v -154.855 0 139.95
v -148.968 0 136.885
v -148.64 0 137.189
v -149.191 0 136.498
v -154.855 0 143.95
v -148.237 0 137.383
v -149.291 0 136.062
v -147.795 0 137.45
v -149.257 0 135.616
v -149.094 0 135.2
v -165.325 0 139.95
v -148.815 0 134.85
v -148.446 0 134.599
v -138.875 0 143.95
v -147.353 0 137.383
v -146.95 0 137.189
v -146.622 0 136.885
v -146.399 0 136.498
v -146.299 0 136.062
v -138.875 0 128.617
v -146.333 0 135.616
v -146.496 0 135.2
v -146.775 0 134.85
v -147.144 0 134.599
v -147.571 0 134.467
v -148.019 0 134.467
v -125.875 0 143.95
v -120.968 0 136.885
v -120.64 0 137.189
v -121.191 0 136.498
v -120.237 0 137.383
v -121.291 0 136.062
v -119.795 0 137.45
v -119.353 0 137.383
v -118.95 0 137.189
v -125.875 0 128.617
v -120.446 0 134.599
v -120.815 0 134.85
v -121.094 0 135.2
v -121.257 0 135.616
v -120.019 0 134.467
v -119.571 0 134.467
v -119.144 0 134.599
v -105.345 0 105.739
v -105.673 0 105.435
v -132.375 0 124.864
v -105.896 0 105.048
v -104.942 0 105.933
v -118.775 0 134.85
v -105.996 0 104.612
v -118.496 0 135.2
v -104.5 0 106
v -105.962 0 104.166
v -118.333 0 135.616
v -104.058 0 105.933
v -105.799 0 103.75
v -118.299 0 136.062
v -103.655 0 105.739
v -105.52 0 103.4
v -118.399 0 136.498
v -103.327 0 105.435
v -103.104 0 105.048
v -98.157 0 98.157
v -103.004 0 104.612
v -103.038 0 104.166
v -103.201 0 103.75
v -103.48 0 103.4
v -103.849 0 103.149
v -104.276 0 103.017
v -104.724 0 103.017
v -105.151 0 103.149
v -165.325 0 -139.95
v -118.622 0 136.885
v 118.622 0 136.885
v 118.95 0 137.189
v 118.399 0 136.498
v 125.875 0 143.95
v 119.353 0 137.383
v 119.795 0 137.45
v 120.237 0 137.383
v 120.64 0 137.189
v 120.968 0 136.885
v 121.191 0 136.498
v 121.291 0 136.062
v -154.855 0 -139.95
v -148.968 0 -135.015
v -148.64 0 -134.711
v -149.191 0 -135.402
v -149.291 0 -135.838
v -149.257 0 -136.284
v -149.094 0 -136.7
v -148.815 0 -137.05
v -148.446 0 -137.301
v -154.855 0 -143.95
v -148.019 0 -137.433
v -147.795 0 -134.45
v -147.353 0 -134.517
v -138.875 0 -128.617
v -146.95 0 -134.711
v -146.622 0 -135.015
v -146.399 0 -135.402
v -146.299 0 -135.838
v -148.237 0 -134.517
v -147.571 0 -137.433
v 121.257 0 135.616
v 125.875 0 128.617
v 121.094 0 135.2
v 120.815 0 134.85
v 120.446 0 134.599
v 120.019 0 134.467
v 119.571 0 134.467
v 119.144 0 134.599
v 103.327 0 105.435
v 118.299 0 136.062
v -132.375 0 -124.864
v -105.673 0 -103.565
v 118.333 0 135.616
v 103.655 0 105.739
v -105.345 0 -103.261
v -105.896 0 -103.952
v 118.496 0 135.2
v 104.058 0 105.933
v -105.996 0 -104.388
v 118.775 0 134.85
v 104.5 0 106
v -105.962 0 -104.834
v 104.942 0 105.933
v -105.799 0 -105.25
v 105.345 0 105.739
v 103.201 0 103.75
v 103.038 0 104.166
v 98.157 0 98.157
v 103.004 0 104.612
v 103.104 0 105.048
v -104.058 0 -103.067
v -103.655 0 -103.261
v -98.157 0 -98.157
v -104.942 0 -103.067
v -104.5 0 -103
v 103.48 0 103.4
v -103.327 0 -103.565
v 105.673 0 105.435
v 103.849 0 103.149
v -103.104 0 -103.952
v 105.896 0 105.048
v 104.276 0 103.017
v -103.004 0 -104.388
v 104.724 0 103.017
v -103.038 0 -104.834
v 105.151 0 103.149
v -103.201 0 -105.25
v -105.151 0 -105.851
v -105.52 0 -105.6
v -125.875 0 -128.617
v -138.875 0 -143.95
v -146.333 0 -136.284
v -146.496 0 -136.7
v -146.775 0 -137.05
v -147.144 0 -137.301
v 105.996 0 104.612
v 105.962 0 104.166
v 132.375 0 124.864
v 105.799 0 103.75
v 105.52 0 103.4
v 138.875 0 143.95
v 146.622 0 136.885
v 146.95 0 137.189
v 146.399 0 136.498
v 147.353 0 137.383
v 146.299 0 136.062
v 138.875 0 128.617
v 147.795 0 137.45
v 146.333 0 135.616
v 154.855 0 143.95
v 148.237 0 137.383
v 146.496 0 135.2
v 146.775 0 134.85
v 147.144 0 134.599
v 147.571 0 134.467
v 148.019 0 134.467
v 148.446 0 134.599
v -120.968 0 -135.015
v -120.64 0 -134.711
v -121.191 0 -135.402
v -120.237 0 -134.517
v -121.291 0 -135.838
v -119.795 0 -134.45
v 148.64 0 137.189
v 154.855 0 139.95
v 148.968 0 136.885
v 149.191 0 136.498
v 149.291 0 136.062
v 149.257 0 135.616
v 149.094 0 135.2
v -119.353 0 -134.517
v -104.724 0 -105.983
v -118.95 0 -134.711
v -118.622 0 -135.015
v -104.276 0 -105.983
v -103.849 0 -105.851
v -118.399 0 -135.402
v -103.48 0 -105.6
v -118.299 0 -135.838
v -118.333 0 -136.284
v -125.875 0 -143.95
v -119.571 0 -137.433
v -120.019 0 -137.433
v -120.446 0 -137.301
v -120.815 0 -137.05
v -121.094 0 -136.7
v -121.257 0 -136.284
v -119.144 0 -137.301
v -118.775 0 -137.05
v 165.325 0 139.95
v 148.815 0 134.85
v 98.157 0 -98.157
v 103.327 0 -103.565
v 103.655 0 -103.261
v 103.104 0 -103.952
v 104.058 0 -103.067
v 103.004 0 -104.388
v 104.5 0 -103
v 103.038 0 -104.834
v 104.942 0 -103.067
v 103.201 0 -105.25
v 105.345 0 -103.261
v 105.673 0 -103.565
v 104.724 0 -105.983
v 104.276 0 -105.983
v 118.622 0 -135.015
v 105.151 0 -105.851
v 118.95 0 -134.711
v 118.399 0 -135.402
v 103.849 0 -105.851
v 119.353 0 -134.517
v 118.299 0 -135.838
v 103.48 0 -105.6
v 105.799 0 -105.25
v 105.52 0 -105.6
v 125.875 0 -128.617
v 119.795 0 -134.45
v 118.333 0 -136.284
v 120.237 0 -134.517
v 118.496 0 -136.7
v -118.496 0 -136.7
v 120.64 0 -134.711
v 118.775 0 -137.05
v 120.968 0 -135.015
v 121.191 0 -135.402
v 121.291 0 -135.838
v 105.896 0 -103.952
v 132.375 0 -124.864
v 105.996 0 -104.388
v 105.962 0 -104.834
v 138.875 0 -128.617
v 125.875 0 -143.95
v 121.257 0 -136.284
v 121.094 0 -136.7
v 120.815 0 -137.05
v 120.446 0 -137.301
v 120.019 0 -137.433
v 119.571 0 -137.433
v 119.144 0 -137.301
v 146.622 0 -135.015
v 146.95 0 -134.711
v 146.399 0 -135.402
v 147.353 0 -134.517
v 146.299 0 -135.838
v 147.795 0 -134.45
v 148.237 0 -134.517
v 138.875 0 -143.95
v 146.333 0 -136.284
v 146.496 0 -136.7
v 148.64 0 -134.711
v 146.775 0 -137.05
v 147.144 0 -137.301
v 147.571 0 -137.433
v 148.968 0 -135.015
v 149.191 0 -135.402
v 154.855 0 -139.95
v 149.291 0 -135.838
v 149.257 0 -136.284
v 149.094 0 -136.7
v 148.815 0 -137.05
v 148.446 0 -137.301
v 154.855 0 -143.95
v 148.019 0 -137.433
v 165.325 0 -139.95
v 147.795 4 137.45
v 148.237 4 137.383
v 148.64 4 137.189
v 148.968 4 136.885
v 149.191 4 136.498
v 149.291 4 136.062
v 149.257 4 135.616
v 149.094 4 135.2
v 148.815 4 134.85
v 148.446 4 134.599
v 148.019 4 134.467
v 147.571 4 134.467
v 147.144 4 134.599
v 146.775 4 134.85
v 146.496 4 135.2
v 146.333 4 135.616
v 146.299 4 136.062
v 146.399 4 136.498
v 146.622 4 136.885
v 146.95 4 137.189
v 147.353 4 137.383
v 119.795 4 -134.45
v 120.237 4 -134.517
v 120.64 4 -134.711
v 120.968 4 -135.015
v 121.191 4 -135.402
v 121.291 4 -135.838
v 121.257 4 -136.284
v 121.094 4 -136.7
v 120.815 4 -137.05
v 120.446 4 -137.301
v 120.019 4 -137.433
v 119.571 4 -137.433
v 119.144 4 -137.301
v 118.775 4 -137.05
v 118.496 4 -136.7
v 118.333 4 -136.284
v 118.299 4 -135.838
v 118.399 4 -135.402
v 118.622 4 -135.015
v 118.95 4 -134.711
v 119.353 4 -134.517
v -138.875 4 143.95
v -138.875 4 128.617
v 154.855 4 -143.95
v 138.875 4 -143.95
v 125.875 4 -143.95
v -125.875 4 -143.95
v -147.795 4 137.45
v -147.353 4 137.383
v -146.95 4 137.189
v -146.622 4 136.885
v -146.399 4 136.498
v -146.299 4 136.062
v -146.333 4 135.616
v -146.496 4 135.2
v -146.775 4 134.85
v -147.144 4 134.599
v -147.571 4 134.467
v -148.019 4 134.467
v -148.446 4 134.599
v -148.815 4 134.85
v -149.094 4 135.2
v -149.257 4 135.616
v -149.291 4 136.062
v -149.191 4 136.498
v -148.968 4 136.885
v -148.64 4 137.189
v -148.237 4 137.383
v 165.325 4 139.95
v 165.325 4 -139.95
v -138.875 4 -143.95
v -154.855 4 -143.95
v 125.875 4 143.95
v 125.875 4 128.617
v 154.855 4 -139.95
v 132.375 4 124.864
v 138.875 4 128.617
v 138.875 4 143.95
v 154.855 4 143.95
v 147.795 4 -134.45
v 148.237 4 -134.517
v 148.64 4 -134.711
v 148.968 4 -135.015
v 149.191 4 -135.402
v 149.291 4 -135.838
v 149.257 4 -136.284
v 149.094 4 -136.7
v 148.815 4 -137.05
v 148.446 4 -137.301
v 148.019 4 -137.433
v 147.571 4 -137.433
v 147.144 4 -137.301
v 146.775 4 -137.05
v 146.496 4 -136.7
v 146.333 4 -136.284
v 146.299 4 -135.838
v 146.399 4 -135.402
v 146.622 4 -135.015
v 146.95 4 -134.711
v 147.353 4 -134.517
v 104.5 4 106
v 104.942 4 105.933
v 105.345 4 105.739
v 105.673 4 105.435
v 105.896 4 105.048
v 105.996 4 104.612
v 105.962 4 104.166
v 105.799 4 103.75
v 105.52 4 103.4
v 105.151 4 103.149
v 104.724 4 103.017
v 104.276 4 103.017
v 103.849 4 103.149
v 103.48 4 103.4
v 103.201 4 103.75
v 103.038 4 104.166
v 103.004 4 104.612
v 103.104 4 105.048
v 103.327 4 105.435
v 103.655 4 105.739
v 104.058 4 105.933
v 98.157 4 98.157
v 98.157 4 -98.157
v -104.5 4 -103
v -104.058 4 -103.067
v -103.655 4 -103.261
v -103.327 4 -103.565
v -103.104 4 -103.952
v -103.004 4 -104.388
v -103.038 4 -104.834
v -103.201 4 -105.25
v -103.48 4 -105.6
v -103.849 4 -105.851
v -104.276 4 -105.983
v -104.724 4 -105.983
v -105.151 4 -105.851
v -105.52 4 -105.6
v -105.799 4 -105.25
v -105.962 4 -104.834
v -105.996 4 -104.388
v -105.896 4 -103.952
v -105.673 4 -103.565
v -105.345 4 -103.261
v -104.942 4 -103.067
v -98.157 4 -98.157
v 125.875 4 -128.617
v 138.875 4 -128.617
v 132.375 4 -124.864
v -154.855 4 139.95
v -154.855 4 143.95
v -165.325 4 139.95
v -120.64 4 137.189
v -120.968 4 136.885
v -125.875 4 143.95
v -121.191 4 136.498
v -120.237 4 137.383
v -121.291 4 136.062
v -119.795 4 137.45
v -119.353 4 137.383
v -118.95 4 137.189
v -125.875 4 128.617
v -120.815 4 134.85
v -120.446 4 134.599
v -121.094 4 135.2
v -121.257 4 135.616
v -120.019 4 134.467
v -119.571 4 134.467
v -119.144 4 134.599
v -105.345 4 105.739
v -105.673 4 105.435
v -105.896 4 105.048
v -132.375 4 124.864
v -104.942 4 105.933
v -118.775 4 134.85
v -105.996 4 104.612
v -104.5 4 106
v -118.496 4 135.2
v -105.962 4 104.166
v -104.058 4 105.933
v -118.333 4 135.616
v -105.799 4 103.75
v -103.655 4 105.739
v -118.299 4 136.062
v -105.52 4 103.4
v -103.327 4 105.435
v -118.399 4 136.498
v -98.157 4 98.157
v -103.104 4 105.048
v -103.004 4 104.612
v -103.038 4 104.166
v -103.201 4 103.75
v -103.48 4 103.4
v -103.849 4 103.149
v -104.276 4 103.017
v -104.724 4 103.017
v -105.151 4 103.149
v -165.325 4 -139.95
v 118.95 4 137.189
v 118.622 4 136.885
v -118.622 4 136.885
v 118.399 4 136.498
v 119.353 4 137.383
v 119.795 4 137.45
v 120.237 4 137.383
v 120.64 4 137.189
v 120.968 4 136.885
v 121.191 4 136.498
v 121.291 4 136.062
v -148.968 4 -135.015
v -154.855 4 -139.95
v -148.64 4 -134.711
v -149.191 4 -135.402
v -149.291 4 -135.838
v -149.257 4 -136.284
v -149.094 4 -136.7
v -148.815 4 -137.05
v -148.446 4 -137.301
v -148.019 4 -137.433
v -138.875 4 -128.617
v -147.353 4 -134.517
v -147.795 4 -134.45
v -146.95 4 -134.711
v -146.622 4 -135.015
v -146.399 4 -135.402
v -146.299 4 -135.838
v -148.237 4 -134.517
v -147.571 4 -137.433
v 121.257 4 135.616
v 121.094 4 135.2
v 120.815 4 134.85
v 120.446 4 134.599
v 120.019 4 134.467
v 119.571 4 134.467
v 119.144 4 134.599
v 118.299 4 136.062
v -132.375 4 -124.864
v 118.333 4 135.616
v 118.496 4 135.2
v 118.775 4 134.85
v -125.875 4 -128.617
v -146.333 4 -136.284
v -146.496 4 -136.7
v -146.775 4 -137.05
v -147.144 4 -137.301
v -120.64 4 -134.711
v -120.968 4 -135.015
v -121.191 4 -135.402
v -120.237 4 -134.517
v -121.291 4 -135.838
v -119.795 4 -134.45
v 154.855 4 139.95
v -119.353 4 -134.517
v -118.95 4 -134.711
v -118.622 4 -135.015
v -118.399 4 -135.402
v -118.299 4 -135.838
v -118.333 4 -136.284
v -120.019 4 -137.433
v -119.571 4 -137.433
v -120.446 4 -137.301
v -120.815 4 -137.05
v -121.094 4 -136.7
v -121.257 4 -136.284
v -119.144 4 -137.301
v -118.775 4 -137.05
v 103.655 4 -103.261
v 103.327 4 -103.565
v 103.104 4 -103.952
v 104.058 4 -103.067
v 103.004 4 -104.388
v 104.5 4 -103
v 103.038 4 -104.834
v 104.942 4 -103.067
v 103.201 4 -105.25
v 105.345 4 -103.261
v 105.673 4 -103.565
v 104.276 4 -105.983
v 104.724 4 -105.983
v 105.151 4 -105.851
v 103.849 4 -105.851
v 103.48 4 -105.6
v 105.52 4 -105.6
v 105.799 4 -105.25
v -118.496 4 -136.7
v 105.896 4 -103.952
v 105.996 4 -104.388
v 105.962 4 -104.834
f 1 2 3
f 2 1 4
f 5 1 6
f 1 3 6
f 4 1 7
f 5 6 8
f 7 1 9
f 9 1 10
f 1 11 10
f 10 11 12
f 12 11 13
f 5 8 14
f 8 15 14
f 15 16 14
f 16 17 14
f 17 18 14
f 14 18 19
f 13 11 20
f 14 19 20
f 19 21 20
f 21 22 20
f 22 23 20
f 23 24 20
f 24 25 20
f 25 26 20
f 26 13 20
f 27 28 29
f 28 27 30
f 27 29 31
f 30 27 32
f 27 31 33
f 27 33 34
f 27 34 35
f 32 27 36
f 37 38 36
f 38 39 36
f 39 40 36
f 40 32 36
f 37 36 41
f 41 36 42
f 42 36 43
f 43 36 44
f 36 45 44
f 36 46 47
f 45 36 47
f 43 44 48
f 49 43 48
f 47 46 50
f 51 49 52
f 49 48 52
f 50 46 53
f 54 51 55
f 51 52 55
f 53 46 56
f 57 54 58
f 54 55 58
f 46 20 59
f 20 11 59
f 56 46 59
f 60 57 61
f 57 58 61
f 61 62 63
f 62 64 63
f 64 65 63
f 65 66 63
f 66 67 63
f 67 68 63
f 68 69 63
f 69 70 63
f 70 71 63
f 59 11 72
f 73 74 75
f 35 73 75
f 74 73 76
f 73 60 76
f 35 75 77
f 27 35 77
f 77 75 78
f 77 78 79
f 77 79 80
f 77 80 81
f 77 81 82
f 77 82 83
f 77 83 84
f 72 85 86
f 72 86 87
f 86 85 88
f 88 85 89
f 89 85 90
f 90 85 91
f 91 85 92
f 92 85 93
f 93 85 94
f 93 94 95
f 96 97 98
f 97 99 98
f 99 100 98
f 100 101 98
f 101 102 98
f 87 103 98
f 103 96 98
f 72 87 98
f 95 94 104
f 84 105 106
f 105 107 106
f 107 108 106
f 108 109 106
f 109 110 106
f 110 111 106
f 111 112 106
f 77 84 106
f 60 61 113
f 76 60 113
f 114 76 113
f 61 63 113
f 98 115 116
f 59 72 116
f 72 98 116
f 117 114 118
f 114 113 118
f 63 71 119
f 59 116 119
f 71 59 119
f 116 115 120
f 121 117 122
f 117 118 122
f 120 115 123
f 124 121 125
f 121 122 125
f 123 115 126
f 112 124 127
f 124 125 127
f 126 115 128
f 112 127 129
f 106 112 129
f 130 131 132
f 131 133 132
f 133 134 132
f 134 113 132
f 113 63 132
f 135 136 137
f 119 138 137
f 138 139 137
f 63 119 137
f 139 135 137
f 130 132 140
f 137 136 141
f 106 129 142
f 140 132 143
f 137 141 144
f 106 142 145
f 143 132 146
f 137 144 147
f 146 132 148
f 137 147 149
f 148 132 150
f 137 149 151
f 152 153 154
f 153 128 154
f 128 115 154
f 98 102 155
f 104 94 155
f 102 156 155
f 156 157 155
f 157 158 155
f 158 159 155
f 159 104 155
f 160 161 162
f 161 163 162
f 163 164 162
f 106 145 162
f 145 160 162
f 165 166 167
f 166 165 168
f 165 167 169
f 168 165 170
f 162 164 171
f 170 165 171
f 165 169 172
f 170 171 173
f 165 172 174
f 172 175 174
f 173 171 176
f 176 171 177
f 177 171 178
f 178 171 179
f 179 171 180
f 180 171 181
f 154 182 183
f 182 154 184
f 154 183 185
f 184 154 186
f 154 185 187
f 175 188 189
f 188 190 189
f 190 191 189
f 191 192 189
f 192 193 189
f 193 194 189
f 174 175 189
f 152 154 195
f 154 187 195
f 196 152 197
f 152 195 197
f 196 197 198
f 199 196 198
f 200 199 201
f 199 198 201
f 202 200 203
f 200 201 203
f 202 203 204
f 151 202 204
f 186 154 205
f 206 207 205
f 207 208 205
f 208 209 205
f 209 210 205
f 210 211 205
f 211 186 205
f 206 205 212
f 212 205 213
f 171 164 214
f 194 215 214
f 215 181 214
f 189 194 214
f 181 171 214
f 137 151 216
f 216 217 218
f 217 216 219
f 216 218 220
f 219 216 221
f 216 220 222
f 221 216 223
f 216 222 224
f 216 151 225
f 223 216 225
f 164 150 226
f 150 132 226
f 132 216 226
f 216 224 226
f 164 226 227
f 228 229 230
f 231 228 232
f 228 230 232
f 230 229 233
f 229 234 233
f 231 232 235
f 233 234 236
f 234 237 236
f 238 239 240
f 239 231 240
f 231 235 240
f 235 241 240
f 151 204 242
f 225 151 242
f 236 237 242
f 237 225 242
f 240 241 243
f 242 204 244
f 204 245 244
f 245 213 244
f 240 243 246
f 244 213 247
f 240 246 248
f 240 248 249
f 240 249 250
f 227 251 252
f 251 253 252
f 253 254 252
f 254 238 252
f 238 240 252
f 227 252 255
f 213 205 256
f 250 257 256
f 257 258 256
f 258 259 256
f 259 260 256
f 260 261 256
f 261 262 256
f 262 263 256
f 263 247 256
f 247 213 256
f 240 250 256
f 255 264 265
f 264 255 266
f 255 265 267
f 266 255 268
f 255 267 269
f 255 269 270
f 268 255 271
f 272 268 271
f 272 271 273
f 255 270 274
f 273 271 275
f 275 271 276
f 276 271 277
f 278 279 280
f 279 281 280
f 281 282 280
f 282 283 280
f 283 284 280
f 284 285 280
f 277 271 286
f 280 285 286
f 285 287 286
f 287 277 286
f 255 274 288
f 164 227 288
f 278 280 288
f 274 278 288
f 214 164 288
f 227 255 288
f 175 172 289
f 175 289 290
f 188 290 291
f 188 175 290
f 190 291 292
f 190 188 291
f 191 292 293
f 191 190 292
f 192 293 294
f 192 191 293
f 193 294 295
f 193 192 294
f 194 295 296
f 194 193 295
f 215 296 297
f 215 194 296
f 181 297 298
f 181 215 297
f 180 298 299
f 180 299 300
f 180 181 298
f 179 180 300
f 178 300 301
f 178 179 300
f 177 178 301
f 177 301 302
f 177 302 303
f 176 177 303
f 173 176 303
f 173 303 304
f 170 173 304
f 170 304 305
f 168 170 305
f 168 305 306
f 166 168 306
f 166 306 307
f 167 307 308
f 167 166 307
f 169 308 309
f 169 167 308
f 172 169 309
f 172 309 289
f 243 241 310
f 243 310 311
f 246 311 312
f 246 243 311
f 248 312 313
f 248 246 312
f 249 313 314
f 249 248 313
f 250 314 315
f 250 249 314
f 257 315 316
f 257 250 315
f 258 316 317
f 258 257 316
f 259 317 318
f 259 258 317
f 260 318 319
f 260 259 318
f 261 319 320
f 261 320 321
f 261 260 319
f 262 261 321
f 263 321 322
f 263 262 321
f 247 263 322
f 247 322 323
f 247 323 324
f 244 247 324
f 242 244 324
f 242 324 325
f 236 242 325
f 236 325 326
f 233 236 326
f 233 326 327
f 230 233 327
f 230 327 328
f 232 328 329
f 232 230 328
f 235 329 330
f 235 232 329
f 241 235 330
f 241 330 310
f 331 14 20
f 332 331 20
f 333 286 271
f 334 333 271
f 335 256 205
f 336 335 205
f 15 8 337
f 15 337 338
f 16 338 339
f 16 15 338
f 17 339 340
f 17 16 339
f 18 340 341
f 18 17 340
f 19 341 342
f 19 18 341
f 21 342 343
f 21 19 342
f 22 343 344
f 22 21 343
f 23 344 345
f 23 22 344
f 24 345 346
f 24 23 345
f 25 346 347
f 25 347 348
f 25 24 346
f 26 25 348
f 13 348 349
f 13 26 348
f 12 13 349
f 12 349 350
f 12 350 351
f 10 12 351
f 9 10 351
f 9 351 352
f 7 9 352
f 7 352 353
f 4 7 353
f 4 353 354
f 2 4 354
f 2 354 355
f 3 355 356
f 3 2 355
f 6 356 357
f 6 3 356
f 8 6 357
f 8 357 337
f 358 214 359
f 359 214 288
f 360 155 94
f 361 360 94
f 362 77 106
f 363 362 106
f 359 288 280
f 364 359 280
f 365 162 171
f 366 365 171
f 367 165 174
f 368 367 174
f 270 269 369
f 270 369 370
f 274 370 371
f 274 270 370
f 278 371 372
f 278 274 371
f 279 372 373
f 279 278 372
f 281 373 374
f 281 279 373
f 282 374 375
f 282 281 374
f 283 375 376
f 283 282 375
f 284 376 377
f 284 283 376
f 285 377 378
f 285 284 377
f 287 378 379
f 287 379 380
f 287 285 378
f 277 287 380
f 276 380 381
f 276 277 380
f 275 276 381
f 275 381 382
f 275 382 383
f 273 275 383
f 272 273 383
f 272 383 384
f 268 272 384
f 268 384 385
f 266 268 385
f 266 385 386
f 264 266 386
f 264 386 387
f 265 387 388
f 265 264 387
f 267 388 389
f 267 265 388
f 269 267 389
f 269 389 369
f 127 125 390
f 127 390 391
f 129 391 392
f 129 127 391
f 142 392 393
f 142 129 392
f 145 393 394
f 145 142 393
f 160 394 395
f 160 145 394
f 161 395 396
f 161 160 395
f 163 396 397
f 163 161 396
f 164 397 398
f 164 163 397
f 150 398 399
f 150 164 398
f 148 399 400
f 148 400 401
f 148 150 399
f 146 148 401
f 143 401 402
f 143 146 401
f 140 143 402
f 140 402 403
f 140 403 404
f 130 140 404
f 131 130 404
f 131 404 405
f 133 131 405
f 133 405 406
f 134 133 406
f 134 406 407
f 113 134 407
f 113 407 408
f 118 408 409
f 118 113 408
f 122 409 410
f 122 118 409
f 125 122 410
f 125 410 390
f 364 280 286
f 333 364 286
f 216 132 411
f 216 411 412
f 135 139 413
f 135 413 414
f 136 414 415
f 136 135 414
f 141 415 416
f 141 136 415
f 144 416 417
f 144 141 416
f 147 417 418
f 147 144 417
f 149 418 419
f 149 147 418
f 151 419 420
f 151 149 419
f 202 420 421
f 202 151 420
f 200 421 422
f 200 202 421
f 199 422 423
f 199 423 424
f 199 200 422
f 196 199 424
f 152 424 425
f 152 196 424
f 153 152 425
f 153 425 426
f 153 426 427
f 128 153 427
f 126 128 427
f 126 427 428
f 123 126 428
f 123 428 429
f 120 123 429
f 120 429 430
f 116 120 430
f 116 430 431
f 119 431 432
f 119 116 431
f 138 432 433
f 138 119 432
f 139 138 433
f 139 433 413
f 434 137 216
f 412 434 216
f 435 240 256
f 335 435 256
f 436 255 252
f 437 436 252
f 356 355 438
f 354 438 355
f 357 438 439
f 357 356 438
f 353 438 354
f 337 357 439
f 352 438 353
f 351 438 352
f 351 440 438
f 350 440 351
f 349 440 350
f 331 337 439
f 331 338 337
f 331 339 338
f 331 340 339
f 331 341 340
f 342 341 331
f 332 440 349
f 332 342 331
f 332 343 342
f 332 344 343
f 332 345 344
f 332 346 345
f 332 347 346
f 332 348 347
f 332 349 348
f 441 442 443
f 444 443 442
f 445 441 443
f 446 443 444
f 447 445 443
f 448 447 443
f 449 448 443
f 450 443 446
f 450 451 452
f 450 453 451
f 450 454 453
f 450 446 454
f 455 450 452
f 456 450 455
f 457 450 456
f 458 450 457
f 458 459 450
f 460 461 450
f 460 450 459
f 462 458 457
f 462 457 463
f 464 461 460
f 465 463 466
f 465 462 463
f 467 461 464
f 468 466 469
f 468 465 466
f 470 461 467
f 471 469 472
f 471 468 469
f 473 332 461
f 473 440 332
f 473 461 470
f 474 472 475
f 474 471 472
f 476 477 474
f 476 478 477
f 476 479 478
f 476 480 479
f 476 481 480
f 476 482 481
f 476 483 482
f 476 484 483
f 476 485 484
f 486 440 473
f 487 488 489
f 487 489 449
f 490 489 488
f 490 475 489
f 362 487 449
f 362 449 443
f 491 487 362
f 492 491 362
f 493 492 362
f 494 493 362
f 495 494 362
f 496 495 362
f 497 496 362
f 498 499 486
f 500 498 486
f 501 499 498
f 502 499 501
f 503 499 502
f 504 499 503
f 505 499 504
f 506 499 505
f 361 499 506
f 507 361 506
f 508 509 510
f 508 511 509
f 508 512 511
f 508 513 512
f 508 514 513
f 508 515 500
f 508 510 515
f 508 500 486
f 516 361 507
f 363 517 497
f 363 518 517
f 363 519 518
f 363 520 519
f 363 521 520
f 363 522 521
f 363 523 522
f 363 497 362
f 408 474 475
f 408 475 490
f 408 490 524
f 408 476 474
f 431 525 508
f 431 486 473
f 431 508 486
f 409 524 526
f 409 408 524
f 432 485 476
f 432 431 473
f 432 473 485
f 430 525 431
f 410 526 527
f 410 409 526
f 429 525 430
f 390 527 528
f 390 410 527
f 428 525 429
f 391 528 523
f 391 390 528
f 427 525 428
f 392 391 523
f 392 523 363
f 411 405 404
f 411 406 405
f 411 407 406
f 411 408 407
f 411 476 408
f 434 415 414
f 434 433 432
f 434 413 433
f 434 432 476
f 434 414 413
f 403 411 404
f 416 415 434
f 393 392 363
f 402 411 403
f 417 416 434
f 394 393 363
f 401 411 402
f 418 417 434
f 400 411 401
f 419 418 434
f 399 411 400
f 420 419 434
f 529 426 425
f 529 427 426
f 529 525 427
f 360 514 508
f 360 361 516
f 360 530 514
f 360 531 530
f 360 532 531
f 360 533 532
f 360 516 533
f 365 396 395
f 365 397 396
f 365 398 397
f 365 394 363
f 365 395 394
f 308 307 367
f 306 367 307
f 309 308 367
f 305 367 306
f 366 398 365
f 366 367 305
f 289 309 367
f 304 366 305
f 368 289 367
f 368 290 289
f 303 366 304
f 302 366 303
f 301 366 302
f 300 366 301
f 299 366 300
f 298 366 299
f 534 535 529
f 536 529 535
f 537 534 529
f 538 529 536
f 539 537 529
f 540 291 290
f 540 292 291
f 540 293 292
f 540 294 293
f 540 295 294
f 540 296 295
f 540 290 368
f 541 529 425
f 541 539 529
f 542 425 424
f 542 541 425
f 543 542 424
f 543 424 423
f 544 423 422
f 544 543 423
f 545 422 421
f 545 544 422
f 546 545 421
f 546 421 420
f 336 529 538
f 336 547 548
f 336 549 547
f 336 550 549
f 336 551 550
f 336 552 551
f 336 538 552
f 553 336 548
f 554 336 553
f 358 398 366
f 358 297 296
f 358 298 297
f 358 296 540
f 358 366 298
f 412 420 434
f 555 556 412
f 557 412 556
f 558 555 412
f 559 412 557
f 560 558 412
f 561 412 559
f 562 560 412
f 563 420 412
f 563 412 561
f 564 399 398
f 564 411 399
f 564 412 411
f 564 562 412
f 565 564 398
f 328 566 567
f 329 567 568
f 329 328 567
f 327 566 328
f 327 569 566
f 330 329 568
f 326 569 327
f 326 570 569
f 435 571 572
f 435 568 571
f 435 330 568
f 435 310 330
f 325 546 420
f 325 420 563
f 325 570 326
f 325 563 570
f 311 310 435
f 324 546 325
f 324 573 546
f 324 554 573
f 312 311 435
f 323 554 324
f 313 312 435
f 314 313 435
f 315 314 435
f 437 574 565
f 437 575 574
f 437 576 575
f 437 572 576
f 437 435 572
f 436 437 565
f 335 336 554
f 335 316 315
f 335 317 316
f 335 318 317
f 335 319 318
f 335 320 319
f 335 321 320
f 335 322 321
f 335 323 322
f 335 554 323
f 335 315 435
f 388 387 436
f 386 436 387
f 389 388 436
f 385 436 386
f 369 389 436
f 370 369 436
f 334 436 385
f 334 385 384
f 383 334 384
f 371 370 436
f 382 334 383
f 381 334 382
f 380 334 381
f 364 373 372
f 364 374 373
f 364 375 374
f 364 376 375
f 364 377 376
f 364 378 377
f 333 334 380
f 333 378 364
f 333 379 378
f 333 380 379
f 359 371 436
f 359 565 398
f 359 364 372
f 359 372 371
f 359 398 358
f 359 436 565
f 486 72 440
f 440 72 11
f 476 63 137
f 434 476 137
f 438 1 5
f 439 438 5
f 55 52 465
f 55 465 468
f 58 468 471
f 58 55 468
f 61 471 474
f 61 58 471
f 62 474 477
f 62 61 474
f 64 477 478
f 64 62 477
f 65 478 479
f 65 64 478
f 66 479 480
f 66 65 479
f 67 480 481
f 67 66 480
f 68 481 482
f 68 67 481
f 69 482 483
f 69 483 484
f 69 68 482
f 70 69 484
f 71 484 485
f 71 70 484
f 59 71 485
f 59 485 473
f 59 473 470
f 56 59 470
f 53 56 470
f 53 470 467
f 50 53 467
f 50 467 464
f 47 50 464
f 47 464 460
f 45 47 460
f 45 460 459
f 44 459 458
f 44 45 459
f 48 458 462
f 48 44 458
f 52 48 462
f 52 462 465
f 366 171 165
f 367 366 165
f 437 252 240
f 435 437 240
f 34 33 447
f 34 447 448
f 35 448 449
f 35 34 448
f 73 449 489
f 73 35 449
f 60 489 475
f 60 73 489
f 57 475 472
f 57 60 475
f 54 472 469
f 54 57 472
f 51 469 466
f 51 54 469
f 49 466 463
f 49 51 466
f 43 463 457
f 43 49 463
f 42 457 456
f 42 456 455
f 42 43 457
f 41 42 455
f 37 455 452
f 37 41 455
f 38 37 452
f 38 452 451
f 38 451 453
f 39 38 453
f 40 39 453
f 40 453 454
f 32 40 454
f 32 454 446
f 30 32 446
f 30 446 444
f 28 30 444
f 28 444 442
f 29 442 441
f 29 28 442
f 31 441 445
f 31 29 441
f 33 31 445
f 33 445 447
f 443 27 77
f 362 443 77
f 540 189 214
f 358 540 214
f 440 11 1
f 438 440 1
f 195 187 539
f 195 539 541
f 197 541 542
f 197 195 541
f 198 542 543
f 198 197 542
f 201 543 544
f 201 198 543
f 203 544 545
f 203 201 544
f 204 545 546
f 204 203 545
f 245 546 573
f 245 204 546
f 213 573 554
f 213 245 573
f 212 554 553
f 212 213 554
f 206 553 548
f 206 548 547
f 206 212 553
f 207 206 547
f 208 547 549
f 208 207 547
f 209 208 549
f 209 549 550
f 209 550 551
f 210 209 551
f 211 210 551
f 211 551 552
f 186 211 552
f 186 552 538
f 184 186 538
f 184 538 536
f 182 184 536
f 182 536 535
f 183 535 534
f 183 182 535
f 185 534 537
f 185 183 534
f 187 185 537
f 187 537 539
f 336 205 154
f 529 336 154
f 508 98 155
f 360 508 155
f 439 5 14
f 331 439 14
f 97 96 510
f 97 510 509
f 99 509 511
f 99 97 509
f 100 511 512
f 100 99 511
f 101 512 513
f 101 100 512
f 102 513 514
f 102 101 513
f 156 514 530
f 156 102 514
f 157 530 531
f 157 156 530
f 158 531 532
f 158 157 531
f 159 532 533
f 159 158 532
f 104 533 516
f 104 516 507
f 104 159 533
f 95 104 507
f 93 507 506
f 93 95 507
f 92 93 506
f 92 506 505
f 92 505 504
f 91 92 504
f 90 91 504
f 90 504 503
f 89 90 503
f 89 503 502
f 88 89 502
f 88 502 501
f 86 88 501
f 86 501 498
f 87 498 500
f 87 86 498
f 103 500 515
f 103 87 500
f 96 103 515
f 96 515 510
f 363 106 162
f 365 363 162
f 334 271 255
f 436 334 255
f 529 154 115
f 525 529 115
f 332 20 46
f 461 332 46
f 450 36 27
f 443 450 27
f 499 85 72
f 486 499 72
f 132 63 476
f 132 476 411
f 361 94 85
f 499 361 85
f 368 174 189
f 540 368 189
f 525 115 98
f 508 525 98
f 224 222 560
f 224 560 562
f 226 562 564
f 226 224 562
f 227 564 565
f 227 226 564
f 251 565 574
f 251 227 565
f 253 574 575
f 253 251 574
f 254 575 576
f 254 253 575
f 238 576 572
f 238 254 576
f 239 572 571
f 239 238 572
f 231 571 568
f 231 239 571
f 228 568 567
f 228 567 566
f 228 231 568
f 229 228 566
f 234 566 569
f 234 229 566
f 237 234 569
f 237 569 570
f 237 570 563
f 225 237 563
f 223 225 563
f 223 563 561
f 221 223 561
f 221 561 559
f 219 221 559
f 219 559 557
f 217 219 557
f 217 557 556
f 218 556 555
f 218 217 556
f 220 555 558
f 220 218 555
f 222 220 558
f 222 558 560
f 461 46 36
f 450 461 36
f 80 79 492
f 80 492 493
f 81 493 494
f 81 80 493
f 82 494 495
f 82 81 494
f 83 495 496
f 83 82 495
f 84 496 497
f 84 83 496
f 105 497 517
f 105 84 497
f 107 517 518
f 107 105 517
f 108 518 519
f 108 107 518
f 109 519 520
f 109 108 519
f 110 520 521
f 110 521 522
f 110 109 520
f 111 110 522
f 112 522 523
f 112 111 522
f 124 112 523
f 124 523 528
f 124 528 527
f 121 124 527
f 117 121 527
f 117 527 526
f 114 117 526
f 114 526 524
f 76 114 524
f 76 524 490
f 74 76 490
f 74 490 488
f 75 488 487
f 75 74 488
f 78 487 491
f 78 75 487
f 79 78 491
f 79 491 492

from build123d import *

# Parameters (mm, degrees)
SKETCH1_R           = 1.5
SKETCH1_W           = 196.314766664
SKETCH1_H           = 196.314766664
BOSS_EXTRUDE1_DEPTH = 4


with BuildPart() as part:
    # Sketch1 → Boss-Extrude1 (new body)
    with BuildSketch(Plane(origin=(0, 0, 0), x_dir=(1, 0, 0), z_dir=(0, 1, 0))):
        Polygon((154.855, -139.95), (165.325, -139.95), (165.325, 139.95), (154.855, 139.95), (154.855, 143.95), (138.875, 143.95), (138.875, 128.61722325), (132.375, 124.864446501), (125.875, 128.61722325), (125.875, 143.95), (-125.875, 143.95), (-125.875, 128.61722325), (-132.375, 124.864446501), (-138.875, 128.61722325), (-138.875, 143.95), (-154.855, 143.95), (-154.855, 139.95), (-165.325, 139.95), (-165.325, -139.95), (-154.855, -139.95), (-154.855, -143.95), (-138.875, -143.95), (-138.875, -128.61722325), (-132.375, -124.864446501), (-125.875, -128.61722325), (-125.875, -143.95), (125.875, -143.95), (125.875, -128.61722325), (132.375, -124.864446501), (138.875, -128.61722325), (138.875, -143.95), (154.855, -143.95), align=None)
        with Locations((-147.795, -135.95)):
            Circle(SKETCH1_R, mode=Mode.SUBTRACT)
        with Locations((-119.795, -135.95)):
            Circle(SKETCH1_R, mode=Mode.SUBTRACT)
        with Locations((-104.5, -104.5)):
            Circle(SKETCH1_R, mode=Mode.SUBTRACT)
        with Locations((119.795, -135.95)):
            Circle(SKETCH1_R, mode=Mode.SUBTRACT)
        with Locations((147.795, -135.95)):
            Circle(SKETCH1_R, mode=Mode.SUBTRACT)
        with Locations((104.5, -104.5)):
            Circle(SKETCH1_R, mode=Mode.SUBTRACT)
        with Locations((-104.5, 104.5)):
            Circle(SKETCH1_R, mode=Mode.SUBTRACT)
        with Locations((-147.795, 135.95)):
            Circle(SKETCH1_R, mode=Mode.SUBTRACT)
        with Locations((-119.795, 135.95)):
            Circle(SKETCH1_R, mode=Mode.SUBTRACT)
        Rectangle(SKETCH1_W, SKETCH1_H, mode=Mode.SUBTRACT)
        with Locations((104.5, 104.5)):
            Circle(SKETCH1_R, mode=Mode.SUBTRACT)
        with Locations((119.795, 135.95)):
            Circle(SKETCH1_R, mode=Mode.SUBTRACT)
        with Locations((147.795, 135.95)):
            Circle(SKETCH1_R, mode=Mode.SUBTRACT)
    extrude(amount=BOSS_EXTRUDE1_DEPTH)


solid = part.part
